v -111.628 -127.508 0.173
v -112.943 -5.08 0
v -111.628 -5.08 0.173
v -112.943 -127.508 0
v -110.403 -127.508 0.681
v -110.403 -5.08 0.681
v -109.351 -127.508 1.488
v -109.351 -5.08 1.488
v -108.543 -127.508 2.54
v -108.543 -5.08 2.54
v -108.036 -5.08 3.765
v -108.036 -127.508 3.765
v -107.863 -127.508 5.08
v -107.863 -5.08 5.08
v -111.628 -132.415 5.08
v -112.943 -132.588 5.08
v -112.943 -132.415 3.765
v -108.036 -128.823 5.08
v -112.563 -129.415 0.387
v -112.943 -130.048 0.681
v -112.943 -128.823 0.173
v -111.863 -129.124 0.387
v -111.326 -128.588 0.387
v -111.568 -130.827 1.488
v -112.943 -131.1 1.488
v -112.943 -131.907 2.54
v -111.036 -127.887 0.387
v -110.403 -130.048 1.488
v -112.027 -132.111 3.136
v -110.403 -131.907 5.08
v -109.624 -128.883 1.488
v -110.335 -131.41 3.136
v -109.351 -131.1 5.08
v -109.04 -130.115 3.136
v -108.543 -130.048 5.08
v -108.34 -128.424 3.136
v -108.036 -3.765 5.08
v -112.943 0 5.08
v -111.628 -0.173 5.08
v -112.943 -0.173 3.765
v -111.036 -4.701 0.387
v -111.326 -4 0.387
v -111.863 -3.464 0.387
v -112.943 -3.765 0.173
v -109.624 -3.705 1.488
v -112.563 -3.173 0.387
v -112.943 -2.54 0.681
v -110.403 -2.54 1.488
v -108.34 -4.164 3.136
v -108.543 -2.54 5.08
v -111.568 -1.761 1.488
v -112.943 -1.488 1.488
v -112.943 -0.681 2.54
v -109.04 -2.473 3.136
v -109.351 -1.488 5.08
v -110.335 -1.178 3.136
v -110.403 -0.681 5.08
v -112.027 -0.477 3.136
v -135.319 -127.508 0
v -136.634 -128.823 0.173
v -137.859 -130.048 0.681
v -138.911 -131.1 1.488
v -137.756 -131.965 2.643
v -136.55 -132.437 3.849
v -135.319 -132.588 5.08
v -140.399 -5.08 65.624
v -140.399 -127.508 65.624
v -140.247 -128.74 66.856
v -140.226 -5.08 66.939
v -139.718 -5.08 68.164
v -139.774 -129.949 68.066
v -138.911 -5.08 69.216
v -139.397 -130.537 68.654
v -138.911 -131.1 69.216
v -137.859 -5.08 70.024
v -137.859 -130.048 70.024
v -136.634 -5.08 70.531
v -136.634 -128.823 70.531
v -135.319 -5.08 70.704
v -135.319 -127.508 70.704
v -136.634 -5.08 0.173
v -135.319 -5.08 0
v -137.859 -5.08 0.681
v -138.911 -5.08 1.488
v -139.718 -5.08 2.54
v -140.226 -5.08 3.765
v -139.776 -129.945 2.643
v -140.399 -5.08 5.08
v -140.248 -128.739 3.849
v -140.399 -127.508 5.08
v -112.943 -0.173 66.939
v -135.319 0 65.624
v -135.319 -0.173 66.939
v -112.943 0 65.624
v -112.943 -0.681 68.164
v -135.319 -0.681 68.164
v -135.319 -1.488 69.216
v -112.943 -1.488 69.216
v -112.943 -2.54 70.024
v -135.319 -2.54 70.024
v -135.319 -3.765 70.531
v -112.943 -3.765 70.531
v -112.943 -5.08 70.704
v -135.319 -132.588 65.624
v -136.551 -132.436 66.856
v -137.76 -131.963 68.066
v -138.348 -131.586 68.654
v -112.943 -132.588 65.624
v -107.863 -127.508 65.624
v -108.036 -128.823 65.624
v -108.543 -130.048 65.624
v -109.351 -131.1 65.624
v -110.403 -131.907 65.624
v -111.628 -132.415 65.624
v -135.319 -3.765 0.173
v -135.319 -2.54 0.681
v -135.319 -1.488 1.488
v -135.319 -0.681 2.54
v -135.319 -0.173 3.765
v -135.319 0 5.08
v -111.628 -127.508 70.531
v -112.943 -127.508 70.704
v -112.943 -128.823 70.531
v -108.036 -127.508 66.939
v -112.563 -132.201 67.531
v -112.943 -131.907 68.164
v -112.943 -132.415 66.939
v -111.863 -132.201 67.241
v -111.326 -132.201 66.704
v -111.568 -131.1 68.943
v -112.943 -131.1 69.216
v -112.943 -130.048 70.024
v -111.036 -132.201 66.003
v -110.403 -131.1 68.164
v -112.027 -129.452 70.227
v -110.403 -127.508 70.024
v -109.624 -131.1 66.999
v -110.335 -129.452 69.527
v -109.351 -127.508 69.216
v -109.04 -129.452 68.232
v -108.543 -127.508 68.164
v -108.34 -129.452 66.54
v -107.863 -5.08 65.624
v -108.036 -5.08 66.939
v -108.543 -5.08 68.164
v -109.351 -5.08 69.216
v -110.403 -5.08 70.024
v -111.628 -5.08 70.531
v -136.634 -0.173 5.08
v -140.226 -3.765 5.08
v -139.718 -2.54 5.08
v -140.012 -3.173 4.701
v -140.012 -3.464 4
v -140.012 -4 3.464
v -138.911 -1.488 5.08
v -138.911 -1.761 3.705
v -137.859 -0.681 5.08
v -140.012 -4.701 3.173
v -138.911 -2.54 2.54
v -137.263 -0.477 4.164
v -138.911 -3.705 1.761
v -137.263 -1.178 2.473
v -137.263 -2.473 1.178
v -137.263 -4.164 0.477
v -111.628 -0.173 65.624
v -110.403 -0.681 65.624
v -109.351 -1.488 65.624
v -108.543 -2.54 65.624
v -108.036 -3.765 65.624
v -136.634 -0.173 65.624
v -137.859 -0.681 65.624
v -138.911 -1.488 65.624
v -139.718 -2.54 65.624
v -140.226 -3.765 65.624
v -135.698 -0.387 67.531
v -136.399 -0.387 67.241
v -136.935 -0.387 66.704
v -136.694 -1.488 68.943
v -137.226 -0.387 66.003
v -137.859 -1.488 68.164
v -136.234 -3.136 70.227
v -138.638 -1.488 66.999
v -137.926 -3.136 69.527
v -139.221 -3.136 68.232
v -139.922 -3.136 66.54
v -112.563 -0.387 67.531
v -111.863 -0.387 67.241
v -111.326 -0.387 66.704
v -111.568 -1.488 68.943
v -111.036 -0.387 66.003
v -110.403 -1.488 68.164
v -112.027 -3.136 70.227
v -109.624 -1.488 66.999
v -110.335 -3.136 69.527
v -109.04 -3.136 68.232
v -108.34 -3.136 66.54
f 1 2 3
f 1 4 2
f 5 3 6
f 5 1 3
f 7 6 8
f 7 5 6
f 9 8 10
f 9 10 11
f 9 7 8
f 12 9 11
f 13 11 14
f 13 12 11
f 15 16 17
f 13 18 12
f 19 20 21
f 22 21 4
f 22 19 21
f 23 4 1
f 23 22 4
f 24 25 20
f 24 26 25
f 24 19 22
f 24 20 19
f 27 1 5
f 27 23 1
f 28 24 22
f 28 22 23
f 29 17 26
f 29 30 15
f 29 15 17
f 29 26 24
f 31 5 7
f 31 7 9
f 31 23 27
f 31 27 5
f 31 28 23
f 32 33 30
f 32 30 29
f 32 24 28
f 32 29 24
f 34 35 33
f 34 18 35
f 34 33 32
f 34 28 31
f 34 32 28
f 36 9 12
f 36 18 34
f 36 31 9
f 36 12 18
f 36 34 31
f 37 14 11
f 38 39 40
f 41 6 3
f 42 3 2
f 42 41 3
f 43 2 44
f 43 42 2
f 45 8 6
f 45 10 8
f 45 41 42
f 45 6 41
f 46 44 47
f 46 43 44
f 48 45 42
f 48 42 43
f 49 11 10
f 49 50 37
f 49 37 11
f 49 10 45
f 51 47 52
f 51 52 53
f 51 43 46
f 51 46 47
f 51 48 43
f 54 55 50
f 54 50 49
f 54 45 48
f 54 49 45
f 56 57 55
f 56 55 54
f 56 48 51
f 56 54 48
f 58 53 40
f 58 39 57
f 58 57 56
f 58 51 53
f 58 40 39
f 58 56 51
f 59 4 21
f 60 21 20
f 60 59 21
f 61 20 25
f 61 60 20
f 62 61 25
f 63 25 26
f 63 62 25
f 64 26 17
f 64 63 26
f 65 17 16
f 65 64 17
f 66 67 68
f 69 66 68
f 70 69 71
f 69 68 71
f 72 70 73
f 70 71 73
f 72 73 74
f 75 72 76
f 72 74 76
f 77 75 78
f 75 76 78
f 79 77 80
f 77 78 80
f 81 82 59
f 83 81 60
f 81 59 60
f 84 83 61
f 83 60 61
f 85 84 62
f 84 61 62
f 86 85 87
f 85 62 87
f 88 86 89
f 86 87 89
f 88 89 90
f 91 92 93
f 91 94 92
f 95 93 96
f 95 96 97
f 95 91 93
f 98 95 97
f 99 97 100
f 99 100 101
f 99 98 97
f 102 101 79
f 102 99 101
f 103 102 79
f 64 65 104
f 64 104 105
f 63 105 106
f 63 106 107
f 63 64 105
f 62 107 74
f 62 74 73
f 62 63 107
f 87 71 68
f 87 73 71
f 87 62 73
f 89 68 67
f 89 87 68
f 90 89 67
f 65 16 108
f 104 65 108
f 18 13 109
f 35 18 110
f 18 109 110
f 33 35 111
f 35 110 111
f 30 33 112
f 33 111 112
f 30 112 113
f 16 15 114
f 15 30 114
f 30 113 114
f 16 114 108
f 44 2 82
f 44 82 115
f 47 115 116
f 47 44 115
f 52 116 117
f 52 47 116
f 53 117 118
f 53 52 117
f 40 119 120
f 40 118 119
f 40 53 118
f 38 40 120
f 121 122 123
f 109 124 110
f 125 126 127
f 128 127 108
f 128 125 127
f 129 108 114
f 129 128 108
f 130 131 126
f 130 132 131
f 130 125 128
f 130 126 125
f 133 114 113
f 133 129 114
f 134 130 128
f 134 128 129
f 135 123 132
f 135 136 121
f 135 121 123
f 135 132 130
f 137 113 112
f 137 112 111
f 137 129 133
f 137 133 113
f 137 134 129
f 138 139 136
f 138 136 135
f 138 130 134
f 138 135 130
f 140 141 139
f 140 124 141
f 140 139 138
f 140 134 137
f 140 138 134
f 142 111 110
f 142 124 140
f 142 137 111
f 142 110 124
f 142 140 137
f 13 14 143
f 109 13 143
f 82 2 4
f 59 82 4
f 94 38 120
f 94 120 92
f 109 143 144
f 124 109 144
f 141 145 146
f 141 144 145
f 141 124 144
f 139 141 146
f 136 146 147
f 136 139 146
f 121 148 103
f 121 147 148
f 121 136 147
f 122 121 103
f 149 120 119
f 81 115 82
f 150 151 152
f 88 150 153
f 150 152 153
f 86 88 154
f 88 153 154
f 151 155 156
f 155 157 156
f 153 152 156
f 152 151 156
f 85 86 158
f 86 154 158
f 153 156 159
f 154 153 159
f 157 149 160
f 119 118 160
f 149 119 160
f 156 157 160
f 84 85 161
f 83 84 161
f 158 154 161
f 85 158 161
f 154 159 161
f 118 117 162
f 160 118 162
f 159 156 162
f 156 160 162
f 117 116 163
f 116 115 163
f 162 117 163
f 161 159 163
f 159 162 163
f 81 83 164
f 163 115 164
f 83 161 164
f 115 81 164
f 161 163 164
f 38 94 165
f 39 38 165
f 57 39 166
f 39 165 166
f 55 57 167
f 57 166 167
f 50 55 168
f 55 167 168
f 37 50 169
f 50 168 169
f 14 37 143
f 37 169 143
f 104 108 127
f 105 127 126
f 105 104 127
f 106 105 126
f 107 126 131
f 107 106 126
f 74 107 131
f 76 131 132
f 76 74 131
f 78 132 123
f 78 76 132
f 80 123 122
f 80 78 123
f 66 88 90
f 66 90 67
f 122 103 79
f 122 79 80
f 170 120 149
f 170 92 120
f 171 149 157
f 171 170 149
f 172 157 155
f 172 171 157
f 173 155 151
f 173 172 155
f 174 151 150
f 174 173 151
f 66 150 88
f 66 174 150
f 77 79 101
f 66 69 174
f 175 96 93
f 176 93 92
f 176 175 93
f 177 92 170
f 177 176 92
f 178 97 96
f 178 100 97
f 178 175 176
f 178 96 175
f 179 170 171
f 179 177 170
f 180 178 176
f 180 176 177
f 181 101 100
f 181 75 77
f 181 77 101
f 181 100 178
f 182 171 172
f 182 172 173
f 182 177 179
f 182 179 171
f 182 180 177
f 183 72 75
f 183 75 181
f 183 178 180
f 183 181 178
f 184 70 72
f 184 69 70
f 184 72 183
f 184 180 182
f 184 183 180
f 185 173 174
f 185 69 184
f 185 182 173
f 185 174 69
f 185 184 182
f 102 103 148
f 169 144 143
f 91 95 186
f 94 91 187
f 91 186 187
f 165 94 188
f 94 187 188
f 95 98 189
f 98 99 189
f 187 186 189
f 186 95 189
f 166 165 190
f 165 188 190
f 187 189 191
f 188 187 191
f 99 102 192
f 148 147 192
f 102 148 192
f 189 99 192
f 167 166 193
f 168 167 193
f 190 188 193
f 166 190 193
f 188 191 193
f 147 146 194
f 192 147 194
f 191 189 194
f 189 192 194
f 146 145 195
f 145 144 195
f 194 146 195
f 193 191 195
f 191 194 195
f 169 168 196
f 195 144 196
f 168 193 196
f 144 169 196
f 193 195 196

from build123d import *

# Parameters (mm, degrees)
F0_W        = 80.0341404974
F0_H        = 70.704229176
F1_DEPTH    = 132.588
F2_DEPTH    = 48.006
F3_DEPTH    = 47.498
F4_R        = 5.08
F5_T1_DEPTH = 85.944229176


# Not quite as in the source:
# - a fillet or chamfer that OpenCascade refuses, or shapes differently, is made with other operations: its cross-section is extruded or revolved along the edge and cut away or added


with BuildPart() as f1:
    # F0 (on Front) → F1 (new body)
    with BuildSketch(Plane.XZ):
        with Locations((-100.3818046302, 35.352114588)):
            Rectangle(F0_W, F0_H)
    extrude(amount=F1_DEPTH)

    # F2 (add): a face of the model
    f2_faces = [f1.faces().sort_by_distance(p)[0] for p in [
        (-60.3647343814, -66.294, 35.352114588),
    ]]
    extrude(f2_faces, amount=-F2_DEPTH)

    # F3 (cut): a face of the model
    f3_faces = [f1.faces().sort_by_distance(p)[0] for p in [
        (-60.3647343814, -66.294, 35.352114588),
    ]]
    extrude(f3_faces, amount=-F3_DEPTH, mode=Mode.SUBTRACT)

    # F4
    f4_edges = [f1.edges().sort_by_distance(p)[0] for p in [
        (-107.862734, -66.294, 70.704229),
        (-124.130805, -132.588, 70.704229),
        (-140.398875, -66.294, 70.704229),
        (-124.130805, 0, 70.704229),
        (-107.862734, -132.588, 35.352115),
        (-124.130805, -132.588, 0),
        (-107.862734, 0, 35.352115),
        (-107.862734, -66.294, 0),
        (-124.130805, 0, 0),
        (-140.398875, 0, 35.352115),
        (-140.398875, -66.294, 0),
    ]]
    fillet(f4_edges, radius=F4_R)

    # F5: fillet of radius 5.08 on 4 edges, made by hand

    # F5_s2 → F5_t1 (cut)
    with BuildSketch(Plane.XY.offset(-7.62)):
        with BuildLine():
            ThreePointArc((-135.3188748789, -132.588), (-138.9109773273, -131.1001024484), (-140.3988748789, -127.508))
            Line((-140.3988748789, -127.508), (-140.3988748789, -132.588))
            Line((-140.3988748789, -132.588), (-135.3188748789, -132.588))
        make_face()
    extrude(amount=F5_T1_DEPTH, mode=Mode.SUBTRACT)


solid = f1.part
